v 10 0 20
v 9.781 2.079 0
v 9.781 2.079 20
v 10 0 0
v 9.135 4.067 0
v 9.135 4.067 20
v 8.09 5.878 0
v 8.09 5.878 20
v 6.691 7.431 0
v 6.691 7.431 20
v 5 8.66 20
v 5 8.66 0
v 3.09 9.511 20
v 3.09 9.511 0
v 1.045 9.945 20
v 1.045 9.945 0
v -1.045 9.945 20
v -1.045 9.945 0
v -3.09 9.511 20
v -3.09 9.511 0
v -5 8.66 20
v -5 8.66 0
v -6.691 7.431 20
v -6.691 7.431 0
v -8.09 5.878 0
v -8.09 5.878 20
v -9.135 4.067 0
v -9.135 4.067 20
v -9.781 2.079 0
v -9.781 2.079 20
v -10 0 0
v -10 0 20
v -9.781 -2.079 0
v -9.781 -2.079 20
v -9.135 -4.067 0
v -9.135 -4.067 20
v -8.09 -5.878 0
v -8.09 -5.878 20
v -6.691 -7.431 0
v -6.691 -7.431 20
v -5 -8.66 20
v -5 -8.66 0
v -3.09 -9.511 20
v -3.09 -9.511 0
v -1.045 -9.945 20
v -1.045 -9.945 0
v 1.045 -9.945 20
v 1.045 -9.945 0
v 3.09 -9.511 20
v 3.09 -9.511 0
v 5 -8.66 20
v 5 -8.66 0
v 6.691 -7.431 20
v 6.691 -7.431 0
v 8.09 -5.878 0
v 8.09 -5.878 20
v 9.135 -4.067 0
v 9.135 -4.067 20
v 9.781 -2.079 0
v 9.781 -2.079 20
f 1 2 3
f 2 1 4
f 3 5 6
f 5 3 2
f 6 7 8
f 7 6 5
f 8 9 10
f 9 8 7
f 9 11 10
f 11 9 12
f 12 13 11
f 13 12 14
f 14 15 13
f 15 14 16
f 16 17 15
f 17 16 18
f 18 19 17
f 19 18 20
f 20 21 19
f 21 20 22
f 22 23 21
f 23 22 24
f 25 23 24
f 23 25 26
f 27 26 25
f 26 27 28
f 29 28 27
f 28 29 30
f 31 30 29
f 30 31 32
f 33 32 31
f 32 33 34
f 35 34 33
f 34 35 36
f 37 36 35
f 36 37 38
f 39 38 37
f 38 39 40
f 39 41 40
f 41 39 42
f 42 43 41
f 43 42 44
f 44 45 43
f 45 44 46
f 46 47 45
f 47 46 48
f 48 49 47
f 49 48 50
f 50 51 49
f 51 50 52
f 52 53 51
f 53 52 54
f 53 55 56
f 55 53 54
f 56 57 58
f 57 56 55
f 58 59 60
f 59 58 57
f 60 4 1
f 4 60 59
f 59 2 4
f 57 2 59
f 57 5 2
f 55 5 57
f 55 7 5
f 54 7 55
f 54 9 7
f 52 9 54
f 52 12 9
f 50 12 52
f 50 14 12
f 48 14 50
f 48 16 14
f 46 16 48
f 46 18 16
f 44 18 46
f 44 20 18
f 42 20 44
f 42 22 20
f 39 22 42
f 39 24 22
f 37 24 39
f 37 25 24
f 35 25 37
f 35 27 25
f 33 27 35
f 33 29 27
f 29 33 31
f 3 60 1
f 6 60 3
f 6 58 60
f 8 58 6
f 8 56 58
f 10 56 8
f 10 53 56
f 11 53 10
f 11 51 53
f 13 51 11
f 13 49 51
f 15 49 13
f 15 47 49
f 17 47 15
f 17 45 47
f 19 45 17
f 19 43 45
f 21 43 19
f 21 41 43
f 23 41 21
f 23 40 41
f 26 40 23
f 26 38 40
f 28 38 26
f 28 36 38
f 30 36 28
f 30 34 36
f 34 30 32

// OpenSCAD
// orcad: round post or puck.
diameter = 20;
height = 20;

cylinder(d = diameter, h = height);
